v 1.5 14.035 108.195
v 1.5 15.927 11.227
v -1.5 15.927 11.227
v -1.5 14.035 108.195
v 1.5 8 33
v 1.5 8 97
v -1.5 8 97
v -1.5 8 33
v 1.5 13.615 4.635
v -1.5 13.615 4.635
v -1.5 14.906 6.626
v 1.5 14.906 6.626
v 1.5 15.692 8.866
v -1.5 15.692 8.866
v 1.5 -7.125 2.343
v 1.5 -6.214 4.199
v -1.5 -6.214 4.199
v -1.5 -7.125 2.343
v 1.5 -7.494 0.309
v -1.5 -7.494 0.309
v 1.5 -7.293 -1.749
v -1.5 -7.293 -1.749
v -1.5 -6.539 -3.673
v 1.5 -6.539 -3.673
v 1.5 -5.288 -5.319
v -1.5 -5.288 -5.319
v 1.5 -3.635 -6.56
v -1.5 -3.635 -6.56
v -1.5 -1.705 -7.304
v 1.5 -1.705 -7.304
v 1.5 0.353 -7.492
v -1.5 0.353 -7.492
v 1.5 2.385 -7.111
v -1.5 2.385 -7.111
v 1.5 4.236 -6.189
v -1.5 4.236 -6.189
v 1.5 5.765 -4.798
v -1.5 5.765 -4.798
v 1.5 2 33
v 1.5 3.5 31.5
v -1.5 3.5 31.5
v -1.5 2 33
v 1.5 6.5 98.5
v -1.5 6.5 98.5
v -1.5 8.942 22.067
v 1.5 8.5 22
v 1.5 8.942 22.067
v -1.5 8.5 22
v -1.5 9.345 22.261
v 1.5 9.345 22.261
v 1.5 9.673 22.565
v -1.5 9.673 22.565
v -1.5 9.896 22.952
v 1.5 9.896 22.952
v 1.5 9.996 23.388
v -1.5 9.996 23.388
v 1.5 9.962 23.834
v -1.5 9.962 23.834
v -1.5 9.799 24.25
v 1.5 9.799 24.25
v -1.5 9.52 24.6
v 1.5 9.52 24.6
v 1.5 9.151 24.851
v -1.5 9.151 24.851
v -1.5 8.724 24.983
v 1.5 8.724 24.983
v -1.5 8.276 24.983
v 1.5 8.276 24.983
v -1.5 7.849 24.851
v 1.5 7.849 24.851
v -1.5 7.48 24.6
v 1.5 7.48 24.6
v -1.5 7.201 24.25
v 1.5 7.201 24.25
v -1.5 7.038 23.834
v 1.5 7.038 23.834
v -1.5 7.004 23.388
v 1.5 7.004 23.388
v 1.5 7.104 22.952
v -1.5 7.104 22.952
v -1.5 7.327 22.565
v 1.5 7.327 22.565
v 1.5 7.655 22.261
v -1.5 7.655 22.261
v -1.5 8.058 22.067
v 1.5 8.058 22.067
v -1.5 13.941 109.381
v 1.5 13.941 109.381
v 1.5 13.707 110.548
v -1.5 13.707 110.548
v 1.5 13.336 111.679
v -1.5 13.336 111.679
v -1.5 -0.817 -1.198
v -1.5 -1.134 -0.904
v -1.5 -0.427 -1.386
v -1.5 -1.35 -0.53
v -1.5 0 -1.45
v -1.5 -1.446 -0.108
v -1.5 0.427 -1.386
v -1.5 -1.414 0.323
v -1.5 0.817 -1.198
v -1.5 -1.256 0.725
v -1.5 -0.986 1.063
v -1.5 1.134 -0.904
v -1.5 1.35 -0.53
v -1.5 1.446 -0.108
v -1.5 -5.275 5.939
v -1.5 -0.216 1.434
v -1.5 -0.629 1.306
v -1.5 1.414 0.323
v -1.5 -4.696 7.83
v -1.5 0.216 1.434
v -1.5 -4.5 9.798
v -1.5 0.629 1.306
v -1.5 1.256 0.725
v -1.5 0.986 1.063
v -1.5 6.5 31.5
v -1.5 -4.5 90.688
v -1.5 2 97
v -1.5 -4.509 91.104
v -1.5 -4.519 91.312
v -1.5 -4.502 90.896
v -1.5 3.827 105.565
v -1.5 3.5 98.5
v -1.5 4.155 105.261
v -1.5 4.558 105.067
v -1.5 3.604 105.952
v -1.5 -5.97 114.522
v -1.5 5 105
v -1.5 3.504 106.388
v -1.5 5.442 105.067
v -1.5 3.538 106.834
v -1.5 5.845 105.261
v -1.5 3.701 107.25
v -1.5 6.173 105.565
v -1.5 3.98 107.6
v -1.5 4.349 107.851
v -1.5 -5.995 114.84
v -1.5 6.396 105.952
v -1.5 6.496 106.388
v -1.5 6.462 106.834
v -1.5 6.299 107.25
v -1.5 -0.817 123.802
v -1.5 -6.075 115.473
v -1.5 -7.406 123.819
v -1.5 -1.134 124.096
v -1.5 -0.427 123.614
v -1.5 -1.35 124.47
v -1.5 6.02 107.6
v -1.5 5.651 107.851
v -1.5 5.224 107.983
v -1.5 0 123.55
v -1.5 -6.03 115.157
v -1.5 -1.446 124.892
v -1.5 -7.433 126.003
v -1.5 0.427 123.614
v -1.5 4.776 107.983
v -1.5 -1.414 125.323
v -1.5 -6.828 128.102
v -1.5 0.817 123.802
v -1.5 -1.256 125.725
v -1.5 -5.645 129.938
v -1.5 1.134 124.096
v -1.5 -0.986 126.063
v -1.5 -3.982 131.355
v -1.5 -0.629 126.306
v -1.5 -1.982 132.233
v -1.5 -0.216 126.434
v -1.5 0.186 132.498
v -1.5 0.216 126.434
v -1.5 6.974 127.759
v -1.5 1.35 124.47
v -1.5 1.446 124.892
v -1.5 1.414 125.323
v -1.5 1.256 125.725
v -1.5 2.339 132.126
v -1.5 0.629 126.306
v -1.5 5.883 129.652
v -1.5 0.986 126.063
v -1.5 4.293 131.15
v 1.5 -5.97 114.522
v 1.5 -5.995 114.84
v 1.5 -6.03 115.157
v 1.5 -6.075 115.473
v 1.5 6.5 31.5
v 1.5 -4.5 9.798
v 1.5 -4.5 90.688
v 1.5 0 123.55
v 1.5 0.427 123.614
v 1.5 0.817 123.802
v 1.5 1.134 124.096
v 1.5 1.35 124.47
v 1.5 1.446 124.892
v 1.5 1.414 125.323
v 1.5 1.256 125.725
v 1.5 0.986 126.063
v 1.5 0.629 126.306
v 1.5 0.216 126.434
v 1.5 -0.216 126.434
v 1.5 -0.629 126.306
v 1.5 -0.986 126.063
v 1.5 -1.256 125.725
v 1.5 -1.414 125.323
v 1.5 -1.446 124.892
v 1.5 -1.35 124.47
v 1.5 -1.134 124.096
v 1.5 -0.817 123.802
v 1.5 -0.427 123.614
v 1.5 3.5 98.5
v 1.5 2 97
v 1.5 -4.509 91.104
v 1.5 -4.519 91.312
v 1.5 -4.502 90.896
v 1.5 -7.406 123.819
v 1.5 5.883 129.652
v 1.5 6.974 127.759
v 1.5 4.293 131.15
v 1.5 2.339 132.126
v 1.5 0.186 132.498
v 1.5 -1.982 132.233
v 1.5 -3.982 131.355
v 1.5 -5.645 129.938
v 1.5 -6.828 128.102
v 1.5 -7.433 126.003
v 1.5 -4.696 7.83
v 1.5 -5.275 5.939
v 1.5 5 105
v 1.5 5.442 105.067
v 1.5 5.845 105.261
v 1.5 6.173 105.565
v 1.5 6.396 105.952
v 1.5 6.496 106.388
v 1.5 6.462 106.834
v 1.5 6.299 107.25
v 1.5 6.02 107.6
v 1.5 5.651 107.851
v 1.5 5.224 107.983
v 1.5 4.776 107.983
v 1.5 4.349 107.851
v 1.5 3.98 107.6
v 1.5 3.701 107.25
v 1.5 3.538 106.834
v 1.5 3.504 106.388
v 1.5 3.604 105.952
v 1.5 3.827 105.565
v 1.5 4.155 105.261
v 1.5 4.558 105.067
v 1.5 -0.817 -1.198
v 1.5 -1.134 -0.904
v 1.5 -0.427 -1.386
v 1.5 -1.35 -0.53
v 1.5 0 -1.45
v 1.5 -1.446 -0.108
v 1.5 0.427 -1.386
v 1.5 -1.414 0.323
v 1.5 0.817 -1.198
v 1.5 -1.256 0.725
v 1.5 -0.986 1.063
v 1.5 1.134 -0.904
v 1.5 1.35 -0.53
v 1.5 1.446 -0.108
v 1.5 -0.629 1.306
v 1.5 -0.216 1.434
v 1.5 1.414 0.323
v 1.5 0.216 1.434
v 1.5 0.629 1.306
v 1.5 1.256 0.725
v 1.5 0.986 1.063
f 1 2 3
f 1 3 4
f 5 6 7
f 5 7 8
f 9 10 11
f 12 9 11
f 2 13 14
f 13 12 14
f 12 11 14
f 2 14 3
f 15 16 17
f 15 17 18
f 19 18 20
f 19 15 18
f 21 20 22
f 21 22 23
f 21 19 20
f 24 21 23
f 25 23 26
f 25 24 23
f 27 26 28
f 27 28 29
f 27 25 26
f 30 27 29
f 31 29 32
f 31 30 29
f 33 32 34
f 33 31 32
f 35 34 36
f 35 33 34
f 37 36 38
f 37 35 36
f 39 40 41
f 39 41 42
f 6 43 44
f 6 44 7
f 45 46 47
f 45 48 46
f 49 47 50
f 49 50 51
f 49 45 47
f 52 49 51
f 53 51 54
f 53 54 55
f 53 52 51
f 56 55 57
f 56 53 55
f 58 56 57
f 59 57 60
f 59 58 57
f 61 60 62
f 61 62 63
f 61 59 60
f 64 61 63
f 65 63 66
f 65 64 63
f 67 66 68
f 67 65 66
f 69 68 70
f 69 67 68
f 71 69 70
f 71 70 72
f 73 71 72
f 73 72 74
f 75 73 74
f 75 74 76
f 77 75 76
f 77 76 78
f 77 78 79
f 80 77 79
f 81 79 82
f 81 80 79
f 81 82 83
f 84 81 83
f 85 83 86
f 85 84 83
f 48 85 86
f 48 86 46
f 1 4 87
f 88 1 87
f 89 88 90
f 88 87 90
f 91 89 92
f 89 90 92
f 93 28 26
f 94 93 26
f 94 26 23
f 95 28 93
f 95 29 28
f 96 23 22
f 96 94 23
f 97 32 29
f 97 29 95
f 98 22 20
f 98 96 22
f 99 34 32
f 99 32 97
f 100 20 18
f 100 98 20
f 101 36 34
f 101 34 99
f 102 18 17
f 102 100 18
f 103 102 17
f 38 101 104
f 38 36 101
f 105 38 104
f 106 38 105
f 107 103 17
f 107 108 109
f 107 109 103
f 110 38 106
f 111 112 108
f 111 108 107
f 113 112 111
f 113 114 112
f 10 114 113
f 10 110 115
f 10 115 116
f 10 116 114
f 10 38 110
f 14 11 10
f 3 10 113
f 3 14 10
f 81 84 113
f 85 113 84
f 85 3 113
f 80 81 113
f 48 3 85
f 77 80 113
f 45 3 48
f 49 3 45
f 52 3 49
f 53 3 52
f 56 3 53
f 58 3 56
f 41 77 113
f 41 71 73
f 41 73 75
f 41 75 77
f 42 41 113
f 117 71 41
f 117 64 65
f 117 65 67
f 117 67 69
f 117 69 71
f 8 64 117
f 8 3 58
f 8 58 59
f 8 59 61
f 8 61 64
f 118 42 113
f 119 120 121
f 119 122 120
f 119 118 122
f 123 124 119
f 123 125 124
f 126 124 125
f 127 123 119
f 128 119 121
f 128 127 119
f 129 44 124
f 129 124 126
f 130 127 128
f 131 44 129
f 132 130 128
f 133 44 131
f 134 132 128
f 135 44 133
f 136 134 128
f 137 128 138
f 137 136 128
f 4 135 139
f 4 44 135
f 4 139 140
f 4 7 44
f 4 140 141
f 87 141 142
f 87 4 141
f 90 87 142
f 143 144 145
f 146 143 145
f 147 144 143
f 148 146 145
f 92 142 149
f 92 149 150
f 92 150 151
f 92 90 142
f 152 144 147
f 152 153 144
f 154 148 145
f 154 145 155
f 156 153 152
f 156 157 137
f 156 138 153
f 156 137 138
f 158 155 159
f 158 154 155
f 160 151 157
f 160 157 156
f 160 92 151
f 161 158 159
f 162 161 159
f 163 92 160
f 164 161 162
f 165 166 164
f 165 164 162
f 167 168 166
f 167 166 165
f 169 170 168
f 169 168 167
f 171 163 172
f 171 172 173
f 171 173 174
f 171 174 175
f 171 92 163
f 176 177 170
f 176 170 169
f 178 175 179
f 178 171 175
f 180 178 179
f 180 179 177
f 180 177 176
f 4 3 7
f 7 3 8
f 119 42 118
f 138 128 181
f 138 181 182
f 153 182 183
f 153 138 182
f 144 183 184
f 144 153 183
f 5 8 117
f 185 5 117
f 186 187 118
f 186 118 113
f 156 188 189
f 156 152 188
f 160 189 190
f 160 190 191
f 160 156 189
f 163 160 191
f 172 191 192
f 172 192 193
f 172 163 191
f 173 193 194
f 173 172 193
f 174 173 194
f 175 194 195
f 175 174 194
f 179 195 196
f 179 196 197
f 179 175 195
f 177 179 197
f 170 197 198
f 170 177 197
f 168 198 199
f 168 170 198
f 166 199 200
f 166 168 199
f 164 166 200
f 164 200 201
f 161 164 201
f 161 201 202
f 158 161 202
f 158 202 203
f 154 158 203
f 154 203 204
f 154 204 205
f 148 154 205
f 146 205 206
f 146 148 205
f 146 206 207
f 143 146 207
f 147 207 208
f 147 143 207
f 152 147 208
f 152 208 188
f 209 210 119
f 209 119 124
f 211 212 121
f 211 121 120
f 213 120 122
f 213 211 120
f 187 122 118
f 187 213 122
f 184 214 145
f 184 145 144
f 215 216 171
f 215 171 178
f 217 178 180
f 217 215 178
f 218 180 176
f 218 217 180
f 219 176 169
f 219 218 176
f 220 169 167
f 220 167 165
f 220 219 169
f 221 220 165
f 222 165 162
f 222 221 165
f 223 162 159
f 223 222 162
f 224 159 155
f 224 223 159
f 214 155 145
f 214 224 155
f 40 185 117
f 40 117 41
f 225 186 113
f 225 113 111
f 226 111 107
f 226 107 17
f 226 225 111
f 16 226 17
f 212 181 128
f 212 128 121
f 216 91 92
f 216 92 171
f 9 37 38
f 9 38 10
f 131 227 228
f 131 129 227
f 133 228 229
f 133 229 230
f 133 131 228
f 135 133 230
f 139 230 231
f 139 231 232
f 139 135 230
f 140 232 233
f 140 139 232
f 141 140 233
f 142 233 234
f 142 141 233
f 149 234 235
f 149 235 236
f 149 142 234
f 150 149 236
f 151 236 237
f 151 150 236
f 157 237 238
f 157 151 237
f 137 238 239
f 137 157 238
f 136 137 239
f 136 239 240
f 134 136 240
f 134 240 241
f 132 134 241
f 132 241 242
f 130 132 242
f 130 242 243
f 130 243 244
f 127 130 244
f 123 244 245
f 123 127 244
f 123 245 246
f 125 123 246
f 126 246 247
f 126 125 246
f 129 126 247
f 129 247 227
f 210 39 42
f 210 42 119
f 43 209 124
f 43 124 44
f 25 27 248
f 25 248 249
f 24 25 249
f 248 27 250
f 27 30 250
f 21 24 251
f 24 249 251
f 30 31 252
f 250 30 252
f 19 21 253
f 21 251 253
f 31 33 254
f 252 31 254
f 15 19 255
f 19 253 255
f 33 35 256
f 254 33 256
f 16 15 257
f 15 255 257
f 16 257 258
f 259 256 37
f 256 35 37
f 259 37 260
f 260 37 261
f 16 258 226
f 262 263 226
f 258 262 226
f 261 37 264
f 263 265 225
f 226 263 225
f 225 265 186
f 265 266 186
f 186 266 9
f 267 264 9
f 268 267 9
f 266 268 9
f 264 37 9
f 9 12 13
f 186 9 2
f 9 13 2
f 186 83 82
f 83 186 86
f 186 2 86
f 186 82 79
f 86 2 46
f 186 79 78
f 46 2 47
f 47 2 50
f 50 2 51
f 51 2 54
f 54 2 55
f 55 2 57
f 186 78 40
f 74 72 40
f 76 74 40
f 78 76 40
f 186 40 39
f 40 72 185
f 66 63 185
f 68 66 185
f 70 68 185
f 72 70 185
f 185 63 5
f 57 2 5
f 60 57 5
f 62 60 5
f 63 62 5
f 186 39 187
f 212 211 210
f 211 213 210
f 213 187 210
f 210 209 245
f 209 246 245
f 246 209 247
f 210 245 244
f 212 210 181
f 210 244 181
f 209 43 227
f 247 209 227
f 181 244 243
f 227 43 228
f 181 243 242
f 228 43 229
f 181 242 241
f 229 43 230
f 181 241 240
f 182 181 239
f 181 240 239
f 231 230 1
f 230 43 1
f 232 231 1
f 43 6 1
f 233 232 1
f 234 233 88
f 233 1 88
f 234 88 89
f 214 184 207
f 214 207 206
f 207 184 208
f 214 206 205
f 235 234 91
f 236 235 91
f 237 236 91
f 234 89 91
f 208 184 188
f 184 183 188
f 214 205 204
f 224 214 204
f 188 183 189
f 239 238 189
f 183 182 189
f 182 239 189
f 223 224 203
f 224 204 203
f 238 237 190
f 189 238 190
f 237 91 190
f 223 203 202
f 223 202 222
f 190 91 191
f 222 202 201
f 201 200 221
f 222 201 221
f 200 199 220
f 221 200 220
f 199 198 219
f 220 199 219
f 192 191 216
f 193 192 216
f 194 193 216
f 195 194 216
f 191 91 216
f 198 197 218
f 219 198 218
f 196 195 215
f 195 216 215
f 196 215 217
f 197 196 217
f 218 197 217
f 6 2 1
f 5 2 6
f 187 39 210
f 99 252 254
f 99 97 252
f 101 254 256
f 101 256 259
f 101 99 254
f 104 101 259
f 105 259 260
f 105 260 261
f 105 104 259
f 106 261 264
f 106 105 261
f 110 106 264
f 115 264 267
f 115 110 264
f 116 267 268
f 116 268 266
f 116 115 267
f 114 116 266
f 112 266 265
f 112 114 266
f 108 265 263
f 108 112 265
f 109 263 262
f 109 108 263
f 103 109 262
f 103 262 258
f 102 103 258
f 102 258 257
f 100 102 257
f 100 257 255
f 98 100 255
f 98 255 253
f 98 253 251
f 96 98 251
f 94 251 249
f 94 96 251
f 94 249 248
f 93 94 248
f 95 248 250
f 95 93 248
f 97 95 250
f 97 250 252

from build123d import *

# Parameters (mm, degrees)
SKETCH1_R           = 1.45
SKETCH1_R_2         = 1.5
BOSS_EXTRUDE1_DEPTH = 1.5
FILLET1_R           = 10


with BuildPart() as part:
    # Sketch1 → Boss-Extrude1 (new, symmetric)
    with BuildSketch(Plane(origin=(0, 0, 0), x_dir=(0, 0, -1), z_dir=(1, 0, 0))):
        with BuildLine():
            Line((-110, 14), (-127.759109434, 6.974045822))
            ThreePointArc((-127.759109434, 6.974045822), (-132.233383985, -1.981957648), (-123.818844483, -7.406407472))
            Line((-123.818844483, -7.406407472), (-115, -6))
            Line((-115, -6), (-91, -4.5))
            Line((-91, -4.5), (-6, -4.5))
            ThreePointArc((-6, -4.5), (5.167384395, -5.435819948), (4.797838271, 5.764611689))
            Line((4.797838271, 5.764611689), (-7.5, 16))
            Line((-7.5, 16), (-110, 14))
        make_face()
        with Locations((-125, 0)):
            Circle(SKETCH1_R, mode=Mode.SUBTRACT)
        with Locations((-106.5, 5)):
            Circle(SKETCH1_R_2, mode=Mode.SUBTRACT)
        Polygon((-98.5, 3.5), (-98.5, 6.5), (-97, 8), (-33, 8), (-31.5, 6.5), (-31.5, 3.5), (-33, 2), (-97, 2), align=None, mode=Mode.SUBTRACT)
        with Locations((-23.5, 8.5)):
            Circle(SKETCH1_R_2, mode=Mode.SUBTRACT)
        Circle(SKETCH1_R, mode=Mode.SUBTRACT)
    extrude(amount=BOSS_EXTRUDE1_DEPTH, both=True)

    # Fillet1
    # the kernel refuses this fillet: 10 mm, written as the material it adds along each edge
    with BuildSketch(Plane(origin=(1.5, -4.5, 6), x_dir=(0, -0.6894794553430702, -0.7243052399781623), z_dir=(-1, 0, 0))) as fillet1_piece_1:
        with BuildLine():
            CenterArc((4.143912969, 9.861667083), FILLET1_R, 226.411082638, 34.04773237)
            Line((-2.750881584, 2.618614683), (0, 0))
            ThreePointArc((0, 0), (1.243173891, 0.103749688), (2.486347782, 0))
        make_face()
    extrude(amount=3)
    with BuildSketch(Plane(origin=(1.5, -4.5, 91), x_dir=(0, 0, -1), z_dir=(-1, 0, 0))) as fillet1_piece_2:
        with BuildLine():
            CenterArc((FILLET1_R * 0.0312195418814, FILLET1_R), FILLET1_R, 266.423665625, 3.576334375)
            Line((-FILLET1_R * 0.0311587442738, FILLET1_R * 0.00194742151711), (0, 0))
            Line((0, 0), (FILLET1_R * 0.0312195418814, 0))
        make_face()
    extrude(amount=3)
    with BuildSketch(Plane(origin=(-1.5, -6, 115), x_dir=(0, 0.06237828615518053, -0.9980525784828885), z_dir=(1, 0, 0))) as fillet1_piece_3:
        with BuildLine():
            CenterArc((FILLET1_R * 0.04790007143, -FILLET1_R), FILLET1_R, 90, 5.484751657)
            Line((-FILLET1_R * 0.0476807691396, -FILLET1_R * 0.00457832909063), (0, 0))
            Line((0, 0), (FILLET1_R * 0.04790007143, 0))
        make_face()
    extrude(amount=3)
    # the kernel refuses this fillet: 10 mm, written as the material it takes off along each edge
    with BuildSketch(Plane(origin=(-6.013343282, 14, 110), x_dir=(0, 0.019508481784595348, -0.99980969146056), z_dir=(1, 0, 0))) as fillet1_2_piece_1:
        with BuildLine():
            CenterArc((FILLET1_R * 0.180533731282, -FILLET1_R), FILLET1_R, 90, 20.467183595)
            Line((-FILLET1_R * 0.169137109533, -FILLET1_R * 0.063127381613), (0, 0))
            Line((0, 0), (FILLET1_R * 0.180533731282, 0))
        make_face()
    extrude(amount=12.026686564, mode=Mode.SUBTRACT)
    with BuildSketch(Plane(origin=(-10.819315302, 16, 7.5), x_dir=(0, -0.6397117694155324, -0.7686148919135308), z_dir=(1, 0, 0))) as fillet1_2_piece_2:
        with BuildLine():
            CenterArc((FILLET1_R * 0.372772612074, -FILLET1_R), FILLET1_R, 90, 40.88815481)
            Line((-FILLET1_R * 0.281811924347, -FILLET1_R * 0.244011187465), (0, 0))
            Line((0, 0), (FILLET1_R * 0.372772612074, 0))
        make_face()
    extrude(amount=21.638630604, mode=Mode.SUBTRACT)


solid = part.part
